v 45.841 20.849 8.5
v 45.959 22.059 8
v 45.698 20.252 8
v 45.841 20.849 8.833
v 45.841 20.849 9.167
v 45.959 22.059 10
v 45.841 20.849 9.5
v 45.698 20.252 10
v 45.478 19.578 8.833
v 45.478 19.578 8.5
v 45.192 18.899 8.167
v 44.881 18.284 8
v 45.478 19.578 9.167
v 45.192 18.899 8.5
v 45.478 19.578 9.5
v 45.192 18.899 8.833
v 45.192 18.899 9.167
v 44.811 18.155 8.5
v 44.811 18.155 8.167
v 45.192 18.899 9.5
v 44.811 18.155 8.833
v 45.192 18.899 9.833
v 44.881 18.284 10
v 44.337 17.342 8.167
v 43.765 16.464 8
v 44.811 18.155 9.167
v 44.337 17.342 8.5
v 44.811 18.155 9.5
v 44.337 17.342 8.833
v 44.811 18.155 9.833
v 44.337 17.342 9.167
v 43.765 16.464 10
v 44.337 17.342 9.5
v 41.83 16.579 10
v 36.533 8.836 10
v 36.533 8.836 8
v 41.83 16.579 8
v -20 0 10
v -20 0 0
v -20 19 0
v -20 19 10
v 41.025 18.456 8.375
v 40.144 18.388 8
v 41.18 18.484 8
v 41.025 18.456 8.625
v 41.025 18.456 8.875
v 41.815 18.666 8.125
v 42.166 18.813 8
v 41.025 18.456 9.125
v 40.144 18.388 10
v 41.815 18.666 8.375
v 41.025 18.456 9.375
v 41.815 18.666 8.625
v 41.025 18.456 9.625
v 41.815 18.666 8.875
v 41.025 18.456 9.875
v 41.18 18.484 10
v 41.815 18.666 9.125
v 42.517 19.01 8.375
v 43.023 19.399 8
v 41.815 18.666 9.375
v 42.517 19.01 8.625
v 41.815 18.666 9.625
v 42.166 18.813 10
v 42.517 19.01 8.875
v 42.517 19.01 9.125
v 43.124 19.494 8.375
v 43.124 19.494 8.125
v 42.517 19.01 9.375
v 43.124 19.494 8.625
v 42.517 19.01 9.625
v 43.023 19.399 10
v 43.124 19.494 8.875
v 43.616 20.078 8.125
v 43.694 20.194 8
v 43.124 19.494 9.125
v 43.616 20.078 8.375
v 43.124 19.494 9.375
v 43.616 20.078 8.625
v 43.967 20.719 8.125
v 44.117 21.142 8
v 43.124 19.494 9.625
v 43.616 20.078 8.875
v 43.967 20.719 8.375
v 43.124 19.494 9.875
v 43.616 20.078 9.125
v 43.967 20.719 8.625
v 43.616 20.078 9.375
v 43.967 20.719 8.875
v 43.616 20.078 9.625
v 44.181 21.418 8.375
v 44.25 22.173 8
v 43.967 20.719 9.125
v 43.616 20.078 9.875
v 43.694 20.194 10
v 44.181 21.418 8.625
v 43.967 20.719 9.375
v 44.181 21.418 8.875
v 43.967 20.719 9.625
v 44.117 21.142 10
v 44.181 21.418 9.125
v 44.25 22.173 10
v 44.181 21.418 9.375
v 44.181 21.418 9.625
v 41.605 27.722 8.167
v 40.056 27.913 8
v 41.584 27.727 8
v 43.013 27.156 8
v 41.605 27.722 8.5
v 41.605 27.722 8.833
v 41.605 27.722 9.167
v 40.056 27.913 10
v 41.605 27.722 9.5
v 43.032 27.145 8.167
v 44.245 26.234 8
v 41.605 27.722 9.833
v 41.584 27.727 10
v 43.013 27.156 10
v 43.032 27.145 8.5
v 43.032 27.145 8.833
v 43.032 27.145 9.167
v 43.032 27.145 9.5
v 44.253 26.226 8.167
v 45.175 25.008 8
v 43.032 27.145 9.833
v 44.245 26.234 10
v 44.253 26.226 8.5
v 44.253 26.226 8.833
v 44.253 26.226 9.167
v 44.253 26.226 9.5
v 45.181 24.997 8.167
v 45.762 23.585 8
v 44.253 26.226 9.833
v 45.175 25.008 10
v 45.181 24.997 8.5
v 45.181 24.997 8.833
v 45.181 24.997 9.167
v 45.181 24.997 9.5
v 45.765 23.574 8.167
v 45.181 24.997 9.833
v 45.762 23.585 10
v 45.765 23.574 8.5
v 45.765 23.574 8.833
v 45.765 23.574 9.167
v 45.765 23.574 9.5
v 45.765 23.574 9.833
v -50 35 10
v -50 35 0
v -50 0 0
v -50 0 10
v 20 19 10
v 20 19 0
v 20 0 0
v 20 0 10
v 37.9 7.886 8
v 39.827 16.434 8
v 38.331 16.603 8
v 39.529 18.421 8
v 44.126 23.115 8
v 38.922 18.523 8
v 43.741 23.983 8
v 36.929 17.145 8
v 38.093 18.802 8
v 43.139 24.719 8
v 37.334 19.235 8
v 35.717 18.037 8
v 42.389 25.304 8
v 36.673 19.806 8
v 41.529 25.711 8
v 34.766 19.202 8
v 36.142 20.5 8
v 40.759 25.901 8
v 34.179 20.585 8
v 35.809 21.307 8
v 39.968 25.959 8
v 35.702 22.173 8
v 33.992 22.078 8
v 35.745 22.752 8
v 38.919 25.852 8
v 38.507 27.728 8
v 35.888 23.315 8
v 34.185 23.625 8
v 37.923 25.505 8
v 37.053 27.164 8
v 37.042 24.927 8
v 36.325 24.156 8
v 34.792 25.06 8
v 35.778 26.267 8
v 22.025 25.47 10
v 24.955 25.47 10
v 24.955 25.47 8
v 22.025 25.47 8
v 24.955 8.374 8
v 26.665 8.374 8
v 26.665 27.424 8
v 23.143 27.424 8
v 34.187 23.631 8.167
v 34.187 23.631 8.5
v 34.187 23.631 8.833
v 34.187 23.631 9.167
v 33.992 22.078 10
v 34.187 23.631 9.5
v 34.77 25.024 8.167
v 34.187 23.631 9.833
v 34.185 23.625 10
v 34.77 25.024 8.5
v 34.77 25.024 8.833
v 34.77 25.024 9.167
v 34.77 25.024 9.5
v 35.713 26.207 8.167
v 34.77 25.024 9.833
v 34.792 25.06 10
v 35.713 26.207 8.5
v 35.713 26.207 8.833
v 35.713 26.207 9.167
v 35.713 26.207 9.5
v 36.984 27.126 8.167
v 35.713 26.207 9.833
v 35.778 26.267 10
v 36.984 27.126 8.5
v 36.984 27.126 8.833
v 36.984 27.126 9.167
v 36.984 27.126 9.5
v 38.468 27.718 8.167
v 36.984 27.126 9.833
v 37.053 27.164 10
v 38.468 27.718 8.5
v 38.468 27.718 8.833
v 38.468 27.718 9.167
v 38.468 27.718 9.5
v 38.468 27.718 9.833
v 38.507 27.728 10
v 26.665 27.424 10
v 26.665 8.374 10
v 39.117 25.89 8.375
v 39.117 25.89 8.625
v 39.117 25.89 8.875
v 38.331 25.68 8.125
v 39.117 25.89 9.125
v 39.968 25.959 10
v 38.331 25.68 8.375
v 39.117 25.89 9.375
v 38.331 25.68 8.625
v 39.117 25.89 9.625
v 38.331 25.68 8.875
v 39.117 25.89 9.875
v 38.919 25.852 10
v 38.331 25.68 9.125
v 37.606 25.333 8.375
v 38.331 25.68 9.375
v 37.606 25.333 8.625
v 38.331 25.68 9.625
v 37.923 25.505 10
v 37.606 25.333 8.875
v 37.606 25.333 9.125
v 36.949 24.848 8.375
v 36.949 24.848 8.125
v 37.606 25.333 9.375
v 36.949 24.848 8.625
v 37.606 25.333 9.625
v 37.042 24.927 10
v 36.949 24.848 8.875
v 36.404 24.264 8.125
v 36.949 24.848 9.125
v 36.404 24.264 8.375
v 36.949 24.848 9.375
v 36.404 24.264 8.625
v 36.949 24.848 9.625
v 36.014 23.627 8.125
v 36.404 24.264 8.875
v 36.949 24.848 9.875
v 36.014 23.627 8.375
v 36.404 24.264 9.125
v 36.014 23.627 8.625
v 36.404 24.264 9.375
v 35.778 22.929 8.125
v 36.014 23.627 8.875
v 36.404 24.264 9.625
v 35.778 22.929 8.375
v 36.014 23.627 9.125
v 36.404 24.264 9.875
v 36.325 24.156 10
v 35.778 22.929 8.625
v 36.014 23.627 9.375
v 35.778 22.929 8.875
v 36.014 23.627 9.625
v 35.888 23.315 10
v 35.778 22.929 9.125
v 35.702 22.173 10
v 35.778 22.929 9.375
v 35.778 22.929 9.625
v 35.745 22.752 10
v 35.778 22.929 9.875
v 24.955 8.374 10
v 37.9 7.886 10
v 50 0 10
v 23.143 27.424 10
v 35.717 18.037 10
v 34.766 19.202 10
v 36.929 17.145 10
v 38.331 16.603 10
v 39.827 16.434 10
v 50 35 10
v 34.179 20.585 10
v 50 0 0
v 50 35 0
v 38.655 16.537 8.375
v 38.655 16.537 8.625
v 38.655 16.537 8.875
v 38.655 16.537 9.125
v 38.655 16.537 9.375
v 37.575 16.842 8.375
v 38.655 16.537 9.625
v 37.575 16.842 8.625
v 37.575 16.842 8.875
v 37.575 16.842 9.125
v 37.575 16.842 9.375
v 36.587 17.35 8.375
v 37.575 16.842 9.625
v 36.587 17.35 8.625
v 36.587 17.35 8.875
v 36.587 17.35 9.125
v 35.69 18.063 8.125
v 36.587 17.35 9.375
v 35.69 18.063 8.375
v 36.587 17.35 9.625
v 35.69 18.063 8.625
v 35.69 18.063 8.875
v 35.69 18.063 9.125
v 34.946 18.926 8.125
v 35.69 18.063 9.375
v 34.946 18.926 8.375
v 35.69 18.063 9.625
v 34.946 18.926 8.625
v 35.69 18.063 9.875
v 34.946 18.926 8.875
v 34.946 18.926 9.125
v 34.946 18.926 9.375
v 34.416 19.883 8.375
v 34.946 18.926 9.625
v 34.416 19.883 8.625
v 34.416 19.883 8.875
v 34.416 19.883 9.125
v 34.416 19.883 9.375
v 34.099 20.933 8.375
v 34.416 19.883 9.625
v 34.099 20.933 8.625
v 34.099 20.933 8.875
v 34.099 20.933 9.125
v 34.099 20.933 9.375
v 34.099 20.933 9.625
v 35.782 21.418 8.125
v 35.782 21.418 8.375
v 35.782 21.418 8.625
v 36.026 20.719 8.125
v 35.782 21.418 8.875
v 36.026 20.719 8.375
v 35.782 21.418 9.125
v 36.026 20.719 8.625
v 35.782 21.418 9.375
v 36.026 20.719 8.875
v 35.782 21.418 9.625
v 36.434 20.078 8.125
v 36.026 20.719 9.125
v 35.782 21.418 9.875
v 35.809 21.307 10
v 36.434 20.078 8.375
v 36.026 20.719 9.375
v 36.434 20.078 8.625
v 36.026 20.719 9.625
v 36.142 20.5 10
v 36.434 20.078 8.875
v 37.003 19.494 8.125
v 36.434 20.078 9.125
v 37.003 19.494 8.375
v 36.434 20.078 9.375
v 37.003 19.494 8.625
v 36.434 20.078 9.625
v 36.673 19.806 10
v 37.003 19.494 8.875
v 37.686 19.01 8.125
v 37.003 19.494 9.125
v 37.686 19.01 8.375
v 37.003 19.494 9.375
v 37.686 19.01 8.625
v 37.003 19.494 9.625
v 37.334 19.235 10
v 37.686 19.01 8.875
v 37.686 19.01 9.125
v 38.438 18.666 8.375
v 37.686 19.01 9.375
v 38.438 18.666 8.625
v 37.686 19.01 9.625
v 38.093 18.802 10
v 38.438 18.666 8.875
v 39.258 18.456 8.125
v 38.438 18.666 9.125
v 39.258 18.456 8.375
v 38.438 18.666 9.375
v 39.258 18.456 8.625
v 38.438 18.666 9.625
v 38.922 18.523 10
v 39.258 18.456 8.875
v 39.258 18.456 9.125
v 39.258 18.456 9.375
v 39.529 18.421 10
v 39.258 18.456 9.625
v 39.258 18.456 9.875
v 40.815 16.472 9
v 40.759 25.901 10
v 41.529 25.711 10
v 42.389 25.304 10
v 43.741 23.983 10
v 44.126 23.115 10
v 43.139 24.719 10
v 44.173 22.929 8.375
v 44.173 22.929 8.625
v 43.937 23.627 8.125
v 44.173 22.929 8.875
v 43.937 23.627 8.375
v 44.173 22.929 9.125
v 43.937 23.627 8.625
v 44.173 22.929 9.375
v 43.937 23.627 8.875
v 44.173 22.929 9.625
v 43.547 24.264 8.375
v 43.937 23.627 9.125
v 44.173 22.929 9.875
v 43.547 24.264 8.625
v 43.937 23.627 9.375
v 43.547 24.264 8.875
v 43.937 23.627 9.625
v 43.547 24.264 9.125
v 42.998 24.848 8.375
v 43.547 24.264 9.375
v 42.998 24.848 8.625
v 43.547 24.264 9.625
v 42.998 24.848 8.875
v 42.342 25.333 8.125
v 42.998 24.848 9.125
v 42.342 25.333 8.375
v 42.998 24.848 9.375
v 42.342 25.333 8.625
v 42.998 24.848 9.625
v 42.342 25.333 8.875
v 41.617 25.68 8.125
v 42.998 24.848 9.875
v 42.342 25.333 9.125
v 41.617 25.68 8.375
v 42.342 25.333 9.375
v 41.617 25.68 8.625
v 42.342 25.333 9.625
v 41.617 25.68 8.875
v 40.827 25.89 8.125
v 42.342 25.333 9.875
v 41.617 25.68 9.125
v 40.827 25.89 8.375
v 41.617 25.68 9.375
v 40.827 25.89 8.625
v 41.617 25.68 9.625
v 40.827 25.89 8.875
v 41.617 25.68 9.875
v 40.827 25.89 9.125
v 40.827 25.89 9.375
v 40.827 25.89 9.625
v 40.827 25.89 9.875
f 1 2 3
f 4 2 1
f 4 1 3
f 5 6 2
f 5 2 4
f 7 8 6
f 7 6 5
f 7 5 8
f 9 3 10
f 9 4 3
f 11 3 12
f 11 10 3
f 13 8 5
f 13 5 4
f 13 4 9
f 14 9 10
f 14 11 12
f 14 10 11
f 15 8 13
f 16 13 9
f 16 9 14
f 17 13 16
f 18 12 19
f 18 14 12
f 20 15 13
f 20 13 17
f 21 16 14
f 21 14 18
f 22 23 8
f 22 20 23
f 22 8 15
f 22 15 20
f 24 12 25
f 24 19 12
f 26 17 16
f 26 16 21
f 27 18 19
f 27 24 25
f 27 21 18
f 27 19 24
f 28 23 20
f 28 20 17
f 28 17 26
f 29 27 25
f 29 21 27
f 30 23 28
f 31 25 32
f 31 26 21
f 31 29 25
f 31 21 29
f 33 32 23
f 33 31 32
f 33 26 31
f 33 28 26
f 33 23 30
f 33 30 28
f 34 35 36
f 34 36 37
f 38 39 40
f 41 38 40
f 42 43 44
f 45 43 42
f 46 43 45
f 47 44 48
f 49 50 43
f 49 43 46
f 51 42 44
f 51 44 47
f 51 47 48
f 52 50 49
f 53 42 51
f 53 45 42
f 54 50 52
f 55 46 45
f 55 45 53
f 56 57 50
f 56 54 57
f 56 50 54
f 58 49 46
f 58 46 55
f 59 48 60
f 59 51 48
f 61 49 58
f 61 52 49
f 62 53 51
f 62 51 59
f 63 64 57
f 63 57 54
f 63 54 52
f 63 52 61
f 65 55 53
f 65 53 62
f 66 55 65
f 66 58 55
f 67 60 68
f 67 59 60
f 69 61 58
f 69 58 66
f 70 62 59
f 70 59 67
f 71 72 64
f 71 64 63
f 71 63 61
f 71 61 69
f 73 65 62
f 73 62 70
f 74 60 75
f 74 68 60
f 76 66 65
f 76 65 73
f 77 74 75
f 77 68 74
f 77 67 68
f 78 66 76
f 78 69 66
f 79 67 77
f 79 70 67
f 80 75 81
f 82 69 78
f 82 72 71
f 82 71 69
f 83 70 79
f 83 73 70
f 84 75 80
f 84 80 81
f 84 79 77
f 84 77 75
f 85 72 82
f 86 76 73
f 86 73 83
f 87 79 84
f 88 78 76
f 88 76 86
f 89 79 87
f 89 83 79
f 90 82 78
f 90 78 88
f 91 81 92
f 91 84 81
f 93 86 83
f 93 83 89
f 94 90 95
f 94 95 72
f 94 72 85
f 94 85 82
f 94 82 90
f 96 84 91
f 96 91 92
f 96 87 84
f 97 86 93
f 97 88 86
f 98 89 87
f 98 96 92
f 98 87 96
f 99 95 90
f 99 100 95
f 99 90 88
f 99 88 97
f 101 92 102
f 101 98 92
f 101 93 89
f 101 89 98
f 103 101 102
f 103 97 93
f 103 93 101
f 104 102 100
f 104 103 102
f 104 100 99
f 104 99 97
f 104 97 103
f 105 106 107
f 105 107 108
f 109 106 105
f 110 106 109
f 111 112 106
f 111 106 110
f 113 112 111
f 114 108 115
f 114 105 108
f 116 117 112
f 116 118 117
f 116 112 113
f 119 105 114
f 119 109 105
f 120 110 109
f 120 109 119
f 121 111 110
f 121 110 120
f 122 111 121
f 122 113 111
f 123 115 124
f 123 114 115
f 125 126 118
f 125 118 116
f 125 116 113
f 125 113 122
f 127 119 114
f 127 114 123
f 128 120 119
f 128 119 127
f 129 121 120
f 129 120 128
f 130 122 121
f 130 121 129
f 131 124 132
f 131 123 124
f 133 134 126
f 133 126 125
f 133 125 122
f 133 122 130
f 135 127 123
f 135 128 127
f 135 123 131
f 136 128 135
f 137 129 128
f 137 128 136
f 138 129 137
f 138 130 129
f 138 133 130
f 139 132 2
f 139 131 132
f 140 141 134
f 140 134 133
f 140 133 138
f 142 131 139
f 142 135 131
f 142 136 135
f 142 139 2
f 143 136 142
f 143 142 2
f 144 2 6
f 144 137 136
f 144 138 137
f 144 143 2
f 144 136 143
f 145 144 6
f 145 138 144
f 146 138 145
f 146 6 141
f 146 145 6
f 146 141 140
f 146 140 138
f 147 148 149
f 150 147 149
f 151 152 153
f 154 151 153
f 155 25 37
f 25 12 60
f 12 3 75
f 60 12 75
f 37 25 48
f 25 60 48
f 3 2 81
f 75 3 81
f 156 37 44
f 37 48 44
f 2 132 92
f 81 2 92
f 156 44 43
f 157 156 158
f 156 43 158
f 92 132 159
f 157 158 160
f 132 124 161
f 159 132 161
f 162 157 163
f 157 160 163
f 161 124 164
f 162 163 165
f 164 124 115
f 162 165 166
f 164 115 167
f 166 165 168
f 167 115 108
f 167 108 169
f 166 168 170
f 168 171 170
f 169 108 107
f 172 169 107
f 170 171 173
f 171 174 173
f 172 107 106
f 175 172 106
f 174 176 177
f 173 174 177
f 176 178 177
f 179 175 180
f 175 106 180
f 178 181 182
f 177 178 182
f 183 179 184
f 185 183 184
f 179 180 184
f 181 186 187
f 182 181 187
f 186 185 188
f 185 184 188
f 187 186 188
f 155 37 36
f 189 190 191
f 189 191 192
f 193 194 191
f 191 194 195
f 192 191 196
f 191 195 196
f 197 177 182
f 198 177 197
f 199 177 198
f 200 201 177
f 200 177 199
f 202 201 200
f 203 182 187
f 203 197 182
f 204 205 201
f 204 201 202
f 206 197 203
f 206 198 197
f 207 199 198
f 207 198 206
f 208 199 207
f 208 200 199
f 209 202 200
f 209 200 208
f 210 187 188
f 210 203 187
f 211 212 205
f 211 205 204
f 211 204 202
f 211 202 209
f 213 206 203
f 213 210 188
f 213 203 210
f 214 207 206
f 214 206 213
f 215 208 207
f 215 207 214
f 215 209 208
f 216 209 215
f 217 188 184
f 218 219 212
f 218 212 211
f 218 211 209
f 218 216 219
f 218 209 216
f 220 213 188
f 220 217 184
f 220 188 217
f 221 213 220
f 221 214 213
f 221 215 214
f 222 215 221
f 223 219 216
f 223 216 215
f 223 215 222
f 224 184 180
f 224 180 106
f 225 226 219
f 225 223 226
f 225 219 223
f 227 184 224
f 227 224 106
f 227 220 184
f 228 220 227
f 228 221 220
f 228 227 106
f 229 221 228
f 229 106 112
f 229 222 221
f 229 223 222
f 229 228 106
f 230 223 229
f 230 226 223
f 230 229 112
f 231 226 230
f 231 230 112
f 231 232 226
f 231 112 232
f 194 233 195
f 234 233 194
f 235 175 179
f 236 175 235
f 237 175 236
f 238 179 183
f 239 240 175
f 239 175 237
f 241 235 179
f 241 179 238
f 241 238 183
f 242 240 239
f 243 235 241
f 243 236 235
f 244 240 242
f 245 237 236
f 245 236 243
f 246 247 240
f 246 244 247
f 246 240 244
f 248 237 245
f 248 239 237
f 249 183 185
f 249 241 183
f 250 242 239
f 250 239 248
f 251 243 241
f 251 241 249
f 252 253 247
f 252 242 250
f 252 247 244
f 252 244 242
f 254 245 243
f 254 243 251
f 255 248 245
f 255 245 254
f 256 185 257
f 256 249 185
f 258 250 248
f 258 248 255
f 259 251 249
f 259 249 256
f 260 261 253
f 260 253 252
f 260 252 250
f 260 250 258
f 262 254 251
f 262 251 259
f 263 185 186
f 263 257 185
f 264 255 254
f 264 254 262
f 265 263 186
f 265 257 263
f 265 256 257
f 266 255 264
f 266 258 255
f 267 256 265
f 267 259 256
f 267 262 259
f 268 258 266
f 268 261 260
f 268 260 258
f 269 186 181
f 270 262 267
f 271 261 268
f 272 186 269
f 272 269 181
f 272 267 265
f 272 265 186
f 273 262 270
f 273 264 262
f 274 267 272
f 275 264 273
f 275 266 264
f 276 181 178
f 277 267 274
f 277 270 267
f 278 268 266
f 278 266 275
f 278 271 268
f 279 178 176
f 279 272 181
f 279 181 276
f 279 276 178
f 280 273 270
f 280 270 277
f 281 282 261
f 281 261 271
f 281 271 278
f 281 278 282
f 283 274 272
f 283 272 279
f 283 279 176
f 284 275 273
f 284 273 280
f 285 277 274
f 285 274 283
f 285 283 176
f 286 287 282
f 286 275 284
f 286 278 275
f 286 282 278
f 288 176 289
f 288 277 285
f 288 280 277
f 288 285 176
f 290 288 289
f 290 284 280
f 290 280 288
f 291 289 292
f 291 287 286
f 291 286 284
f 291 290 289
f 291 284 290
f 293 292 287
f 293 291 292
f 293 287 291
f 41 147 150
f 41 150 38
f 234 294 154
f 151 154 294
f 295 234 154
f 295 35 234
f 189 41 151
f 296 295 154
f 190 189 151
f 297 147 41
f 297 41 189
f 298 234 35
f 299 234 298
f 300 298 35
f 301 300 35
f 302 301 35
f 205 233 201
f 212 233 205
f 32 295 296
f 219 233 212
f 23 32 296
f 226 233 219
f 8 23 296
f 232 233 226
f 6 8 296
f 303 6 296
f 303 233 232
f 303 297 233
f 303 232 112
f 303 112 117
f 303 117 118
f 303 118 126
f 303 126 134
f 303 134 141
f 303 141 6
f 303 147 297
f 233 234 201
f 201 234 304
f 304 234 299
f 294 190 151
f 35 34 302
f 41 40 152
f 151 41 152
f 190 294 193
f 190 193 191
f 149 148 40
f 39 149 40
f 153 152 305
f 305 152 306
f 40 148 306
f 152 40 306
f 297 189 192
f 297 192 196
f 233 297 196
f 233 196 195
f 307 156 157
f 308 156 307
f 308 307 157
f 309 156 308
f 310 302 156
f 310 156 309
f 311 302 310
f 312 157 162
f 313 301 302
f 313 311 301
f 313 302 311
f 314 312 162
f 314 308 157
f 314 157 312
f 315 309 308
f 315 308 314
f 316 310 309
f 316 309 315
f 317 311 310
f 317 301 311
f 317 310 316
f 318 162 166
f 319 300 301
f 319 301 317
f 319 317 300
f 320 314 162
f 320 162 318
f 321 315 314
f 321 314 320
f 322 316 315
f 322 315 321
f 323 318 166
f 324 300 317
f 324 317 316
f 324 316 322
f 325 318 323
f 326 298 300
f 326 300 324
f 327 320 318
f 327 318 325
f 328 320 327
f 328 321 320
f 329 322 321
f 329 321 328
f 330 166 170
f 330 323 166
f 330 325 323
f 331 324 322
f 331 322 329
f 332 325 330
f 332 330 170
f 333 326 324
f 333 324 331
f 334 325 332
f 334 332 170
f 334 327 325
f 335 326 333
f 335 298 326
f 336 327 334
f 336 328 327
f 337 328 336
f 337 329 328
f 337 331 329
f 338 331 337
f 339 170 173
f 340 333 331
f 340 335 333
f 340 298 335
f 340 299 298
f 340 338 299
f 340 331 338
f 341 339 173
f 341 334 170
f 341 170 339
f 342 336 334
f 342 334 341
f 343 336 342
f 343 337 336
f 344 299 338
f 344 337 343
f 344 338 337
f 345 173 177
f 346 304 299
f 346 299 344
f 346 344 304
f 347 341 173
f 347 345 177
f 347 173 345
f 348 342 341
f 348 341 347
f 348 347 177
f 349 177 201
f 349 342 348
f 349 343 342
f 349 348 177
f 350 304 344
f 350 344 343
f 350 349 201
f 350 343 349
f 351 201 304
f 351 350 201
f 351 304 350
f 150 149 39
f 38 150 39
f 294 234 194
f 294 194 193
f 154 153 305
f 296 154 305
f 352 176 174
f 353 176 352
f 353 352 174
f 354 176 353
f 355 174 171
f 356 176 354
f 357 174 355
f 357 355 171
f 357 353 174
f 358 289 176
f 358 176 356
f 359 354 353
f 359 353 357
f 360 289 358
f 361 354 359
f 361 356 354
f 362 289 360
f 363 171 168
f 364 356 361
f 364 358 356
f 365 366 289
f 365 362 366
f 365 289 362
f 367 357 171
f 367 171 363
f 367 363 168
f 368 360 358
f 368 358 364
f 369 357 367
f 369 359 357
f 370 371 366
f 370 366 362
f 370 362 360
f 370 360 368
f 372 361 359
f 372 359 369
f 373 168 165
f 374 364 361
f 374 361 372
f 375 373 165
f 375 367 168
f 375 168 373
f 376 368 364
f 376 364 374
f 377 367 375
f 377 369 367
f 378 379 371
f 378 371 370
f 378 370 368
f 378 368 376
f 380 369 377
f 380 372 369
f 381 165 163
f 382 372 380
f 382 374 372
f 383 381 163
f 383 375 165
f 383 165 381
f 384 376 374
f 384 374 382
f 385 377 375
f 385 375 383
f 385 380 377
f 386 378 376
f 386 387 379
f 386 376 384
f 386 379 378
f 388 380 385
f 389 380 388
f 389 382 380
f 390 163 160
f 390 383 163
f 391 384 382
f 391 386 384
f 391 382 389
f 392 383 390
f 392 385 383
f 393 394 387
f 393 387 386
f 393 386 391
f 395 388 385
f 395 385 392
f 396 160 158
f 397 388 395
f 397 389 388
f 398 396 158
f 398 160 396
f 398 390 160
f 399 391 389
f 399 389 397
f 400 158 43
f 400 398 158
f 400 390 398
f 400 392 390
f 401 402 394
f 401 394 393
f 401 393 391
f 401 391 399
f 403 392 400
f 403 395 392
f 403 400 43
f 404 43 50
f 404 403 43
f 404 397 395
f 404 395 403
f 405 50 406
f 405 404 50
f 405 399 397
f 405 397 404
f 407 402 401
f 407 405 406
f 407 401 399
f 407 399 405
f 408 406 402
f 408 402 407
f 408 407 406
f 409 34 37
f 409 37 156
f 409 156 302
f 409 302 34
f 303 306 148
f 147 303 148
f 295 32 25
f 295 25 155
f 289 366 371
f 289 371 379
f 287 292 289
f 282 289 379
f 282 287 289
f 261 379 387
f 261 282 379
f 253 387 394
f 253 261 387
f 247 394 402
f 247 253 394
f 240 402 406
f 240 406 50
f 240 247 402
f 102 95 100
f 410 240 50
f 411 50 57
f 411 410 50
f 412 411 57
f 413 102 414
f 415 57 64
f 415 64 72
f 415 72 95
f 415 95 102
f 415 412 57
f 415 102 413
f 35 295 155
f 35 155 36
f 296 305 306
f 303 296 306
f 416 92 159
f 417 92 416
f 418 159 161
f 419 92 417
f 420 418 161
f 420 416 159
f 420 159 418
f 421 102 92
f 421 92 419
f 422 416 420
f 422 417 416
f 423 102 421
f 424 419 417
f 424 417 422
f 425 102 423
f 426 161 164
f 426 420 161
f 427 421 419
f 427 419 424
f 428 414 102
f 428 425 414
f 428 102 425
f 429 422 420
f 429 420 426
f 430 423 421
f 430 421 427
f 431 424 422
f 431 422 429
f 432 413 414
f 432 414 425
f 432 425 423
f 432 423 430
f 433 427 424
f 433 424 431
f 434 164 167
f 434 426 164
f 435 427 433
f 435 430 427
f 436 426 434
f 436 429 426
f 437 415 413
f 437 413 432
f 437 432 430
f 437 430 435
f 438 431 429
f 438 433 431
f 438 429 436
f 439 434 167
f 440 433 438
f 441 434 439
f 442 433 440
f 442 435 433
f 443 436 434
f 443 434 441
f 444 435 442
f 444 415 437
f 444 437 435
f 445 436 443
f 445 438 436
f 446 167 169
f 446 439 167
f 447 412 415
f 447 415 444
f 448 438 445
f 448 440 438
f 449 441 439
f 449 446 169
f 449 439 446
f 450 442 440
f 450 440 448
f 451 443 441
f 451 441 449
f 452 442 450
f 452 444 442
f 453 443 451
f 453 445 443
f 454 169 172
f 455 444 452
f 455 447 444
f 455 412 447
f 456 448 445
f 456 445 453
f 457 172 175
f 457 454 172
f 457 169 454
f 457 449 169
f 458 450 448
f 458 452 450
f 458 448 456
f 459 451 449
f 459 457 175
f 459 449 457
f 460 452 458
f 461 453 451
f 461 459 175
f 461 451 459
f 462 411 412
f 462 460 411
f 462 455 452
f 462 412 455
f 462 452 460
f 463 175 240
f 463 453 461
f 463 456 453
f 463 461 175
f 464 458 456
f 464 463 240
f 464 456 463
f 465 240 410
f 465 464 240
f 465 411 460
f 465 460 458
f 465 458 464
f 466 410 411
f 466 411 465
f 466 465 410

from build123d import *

# Parameters (mm, degrees)
BOSS_EXTRUDE1_DEPTH = 10
CUT_EXTRUDE1_DEPTH  = 2


with BuildPart() as part:
    # Sketch2 → Boss-Extrude1 (new body)
    with BuildSketch(Plane.XY):
        Polygon((50, 35), (-50, 35), (-50, 0), (-20, 0), (-20, 19), (20, 19), (20, 0), (50, 0), align=None)
    extrude(amount=BOSS_EXTRUDE1_DEPTH)

    # Sketch3 → Cut-Extrude1 (cut)
    # profile 1 of 2: a face of its own
    with BuildSketch(Plane.XY.offset(10)):
        Polygon((23.142767448, 27.42405293), (26.665033073, 27.42405293), (26.665033073, 8.37405293), (24.955417689, 8.37405293), (24.955417689, 25.470206776), (22.024648458, 25.470206776), align=None)
    # profile 2 of 2: a face of its own
    with BuildSketch(Plane.XY.offset(10)):
        with BuildLine():
            Line((37.899648458, 7.885591391), (36.533482593, 8.835801728))
            Line((36.533482593, 8.835801728), (41.8302374, 16.578680334))
            add(Edge.make_bspline(
                [(41.8302374, 16.578680334), (41.492286397, 16.537352375), (40.826842028, 16.455975319), (40.156624373, 16.44102567), (39.826781872, 16.433668314)],
                knots=[0, 0, 0, 0, 1.015715272, 2, 2, 2, 2], degree=3))
            add(Edge.make_bspline(
                [(39.826781872, 16.433668314), (39.626800154, 16.438790459), (39.234253531, 16.448844781), (38.657138394, 16.528538052), (38.102589842, 16.651275176), (37.572078062, 16.834420543), (37.063609043, 17.062031081), (36.578292803, 17.344281398), (36.116782656, 17.676329928), (35.684035182, 18.056420925), (35.290452718, 18.47376861), (34.939805911, 18.915487181), (34.648389179, 19.386707821), (34.406309478, 19.877818016), (34.222719438, 20.395876512), (34.089029055, 20.934988247), (34.00672024, 21.498931612), (33.99692802, 21.882789824), (33.99195615, 22.077688747)],
                knots=[0, 0, 0, 0, 1.060718605, 2.082097864, 3.085795603, 4.069760067, 5.054557537, 6.03741023, 7.043284206, 8.066802108, 9.088538119, 10.083643548, 11.053783639, 12.022749082, 12.983451788, 13.964007469, 14.966251758, 16, 16, 16, 16], degree=3))
            add(Edge.make_bspline(
                [(33.99195615, 22.077688747), (34.001396431, 22.344218128), (34.019925787, 22.867361236), (34.169052003, 23.631722179), (34.414308992, 24.354460366), (34.756274871, 25.033675564), (35.186993855, 25.659597274), (35.704656324, 26.223524132), (36.306113615, 26.717435408), (36.977664319, 27.142000458), (37.703485761, 27.483458086), (38.463682314, 27.735131993), (39.252429168, 27.883170892), (39.786741772, 27.902688222), (40.055748218, 27.912514468)],
                knots=[0, 0, 0, 0, 1.022988612, 2.007919123, 2.978103895, 3.94594894, 4.918897164, 5.887013414, 6.875921846, 7.89917871, 8.930658928, 9.948724884, 10.967259574, 12, 12, 12, 12], degree=3))
            add(Edge.make_bspline(
                [(40.055748218, 27.912514468), (40.319663759, 27.902553152), (40.841135992, 27.882870531), (41.607974728, 27.73872207), (42.342439406, 27.495771037), (43.040458548, 27.160030769), (43.686740206, 26.739184114), (44.267905692, 26.237709063), (44.770692555, 25.655293265), (45.19427682, 25.006023055), (45.534292325, 24.308428486), (45.779614323, 23.580261708), (45.930629872, 22.826759525), (45.949659881, 22.316249601), (45.959263843, 22.058608218)],
                knots=[0, 0, 0, 0, 1.026385292, 2.028040595, 3.023318987, 4.028184125, 5.03290303, 6.015178782, 7.004435299, 8.016004309, 9.023023918, 10.015172535, 10.998308025, 12, 12, 12, 12], degree=3))
            add(Edge.make_bspline(
                [(45.959263843, 22.058608218), (45.952849931, 21.858617143), (45.939840916, 21.452985271), (45.848747588, 20.836688691), (45.69406058, 20.208304142), (45.518519191, 19.676419457), (45.34907125, 19.237134894), (45.189589376, 18.890144152), (45.012630369, 18.524921562), (44.806243945, 18.145296765), (44.584380587, 17.746430396), (44.333686525, 17.332323043), (44.059880484, 16.902419009), (43.864864438, 16.612602716), (43.765003025, 16.464197161)],
                knots=[0, 0, 0, 0, 1.179839688, 2.393009684, 3.667231171, 4.993948276, 5.694988576, 6.444077775, 7.246288328, 8.089075292, 8.993003841, 9.939041771, 10.944649915, 12, 12, 12, 12], degree=3))
            Line((43.765003025, 16.464197161), (37.899648458, 7.885591391))
        make_face()
        with BuildLine():
            add(Edge.make_bspline(
                [(40.14351865, 18.387514468), (40.295015213, 18.391653129), (40.589927518, 18.399709693), (41.021966817, 18.44874571), (41.429768552, 18.535689834), (41.814422066, 18.660438552), (42.179784204, 18.81096985), (42.520051647, 19.00262366), (42.835509171, 19.231314202), (43.128269174, 19.488271573), (43.388241801, 19.773752606), (43.61979744, 20.072549715), (43.816614242, 20.385974521), (43.972080079, 20.717952134), (44.099903268, 21.060401512), (44.188175591, 21.418837359), (44.237076034, 21.791392226), (44.245412177, 22.044477779), (44.249648458, 22.173091391)],
                knots=[0, 0, 0, 0, 1.163407946, 2.26475976, 3.333800367, 4.359385343, 5.366239384, 6.363380779, 7.350133999, 8.353570782, 9.349036268, 10.310270964, 11.253520213, 12.184142, 13.120487599, 14.056272588, 15.012232024, 16, 16, 16, 16], degree=3))
            add(Edge.make_bspline(
                [(44.249648458, 22.173091391), (44.246003544, 22.301758712), (44.238820795, 22.55531345), (44.181195635, 22.928419891), (44.079821206, 23.285978925), (43.943801568, 23.629948065), (43.764621417, 23.957501232), (43.549609587, 24.27275082), (43.294162968, 24.573697973), (43.000234715, 24.853264798), (42.683272362, 25.110972649), (42.345485925, 25.338408291), (41.989659596, 25.52902366), (41.617964216, 25.686316625), (41.229625345, 25.809062718), (40.824872781, 25.897331517), (40.401661216, 25.946163495), (40.114380216, 25.95444695), (39.967977785, 25.958668314)],
                knots=[0, 0, 0, 0, 0.972161553, 1.915763587, 2.844109794, 3.775983486, 4.705125789, 5.659731448, 6.655561913, 7.682237399, 8.721216875, 9.739758359, 10.754845918, 11.767244016, 12.7857855, 13.828538656, 14.893392813, 16, 16, 16, 16], degree=3))
            add(Edge.make_bspline(
                [(39.967977785, 25.958668314), (39.822848607, 25.954440131), (39.538106356, 25.946144469), (39.118657146, 25.897424338), (38.716641361, 25.808469088), (38.329427685, 25.686373481), (37.957743349, 25.529011926), (37.601933802, 25.338398303), (37.264068354, 25.111025002), (36.947409888, 24.853062027), (36.652962627, 24.574999267), (36.401907962, 24.271432461), (36.186404063, 23.957665221), (36.007470119, 23.629904483), (35.87138499, 23.285990557), (35.770028095, 22.928416741), (35.712398224, 22.555314271), (35.705216121, 22.301758988), (35.701571535, 22.173091391)],
                knots=[0, 0, 0, 0, 1.099389452, 2.15699305, 3.192601482, 4.213358962, 5.227959689, 6.245255729, 7.266013209, 8.307253147, 9.336162325, 10.327954924, 11.284637477, 12.215801273, 13.149702402, 14.080068371, 15.025723358, 16, 16, 16, 16], degree=3))
            add(Edge.make_bspline(
                [(35.701571535, 22.173091391), (35.704869504, 22.044377624), (35.711373703, 21.790530517), (35.774117816, 21.41755115), (35.879046739, 21.060019694), (36.019577993, 20.714459731), (36.204643791, 20.384231475), (36.431740735, 20.070900548), (36.697926636, 19.770915026), (36.99964319, 19.488935773), (37.329851323, 19.230116075), (37.682530756, 19.004072138), (38.051610011, 18.813177834), (38.438388315, 18.660008301), (38.839999326, 18.536936247), (39.260052541, 18.44890595), (39.697158805, 18.400180041), (39.993304563, 18.391776831), (40.14351865, 18.387514468)],
                knots=[0, 0, 0, 0, 0.952633368, 1.87876736, 2.791047057, 3.707742249, 4.635551637, 5.587206343, 6.568248508, 7.601284464, 8.641511608, 9.671105535, 10.699146789, 11.713763218, 12.747829548, 13.806491675, 14.887386225, 16, 16, 16, 16], degree=3))
        make_face(mode=Mode.SUBTRACT)
    extrude(amount=-CUT_EXTRUDE1_DEPTH, mode=Mode.SUBTRACT)


solid = part.part
